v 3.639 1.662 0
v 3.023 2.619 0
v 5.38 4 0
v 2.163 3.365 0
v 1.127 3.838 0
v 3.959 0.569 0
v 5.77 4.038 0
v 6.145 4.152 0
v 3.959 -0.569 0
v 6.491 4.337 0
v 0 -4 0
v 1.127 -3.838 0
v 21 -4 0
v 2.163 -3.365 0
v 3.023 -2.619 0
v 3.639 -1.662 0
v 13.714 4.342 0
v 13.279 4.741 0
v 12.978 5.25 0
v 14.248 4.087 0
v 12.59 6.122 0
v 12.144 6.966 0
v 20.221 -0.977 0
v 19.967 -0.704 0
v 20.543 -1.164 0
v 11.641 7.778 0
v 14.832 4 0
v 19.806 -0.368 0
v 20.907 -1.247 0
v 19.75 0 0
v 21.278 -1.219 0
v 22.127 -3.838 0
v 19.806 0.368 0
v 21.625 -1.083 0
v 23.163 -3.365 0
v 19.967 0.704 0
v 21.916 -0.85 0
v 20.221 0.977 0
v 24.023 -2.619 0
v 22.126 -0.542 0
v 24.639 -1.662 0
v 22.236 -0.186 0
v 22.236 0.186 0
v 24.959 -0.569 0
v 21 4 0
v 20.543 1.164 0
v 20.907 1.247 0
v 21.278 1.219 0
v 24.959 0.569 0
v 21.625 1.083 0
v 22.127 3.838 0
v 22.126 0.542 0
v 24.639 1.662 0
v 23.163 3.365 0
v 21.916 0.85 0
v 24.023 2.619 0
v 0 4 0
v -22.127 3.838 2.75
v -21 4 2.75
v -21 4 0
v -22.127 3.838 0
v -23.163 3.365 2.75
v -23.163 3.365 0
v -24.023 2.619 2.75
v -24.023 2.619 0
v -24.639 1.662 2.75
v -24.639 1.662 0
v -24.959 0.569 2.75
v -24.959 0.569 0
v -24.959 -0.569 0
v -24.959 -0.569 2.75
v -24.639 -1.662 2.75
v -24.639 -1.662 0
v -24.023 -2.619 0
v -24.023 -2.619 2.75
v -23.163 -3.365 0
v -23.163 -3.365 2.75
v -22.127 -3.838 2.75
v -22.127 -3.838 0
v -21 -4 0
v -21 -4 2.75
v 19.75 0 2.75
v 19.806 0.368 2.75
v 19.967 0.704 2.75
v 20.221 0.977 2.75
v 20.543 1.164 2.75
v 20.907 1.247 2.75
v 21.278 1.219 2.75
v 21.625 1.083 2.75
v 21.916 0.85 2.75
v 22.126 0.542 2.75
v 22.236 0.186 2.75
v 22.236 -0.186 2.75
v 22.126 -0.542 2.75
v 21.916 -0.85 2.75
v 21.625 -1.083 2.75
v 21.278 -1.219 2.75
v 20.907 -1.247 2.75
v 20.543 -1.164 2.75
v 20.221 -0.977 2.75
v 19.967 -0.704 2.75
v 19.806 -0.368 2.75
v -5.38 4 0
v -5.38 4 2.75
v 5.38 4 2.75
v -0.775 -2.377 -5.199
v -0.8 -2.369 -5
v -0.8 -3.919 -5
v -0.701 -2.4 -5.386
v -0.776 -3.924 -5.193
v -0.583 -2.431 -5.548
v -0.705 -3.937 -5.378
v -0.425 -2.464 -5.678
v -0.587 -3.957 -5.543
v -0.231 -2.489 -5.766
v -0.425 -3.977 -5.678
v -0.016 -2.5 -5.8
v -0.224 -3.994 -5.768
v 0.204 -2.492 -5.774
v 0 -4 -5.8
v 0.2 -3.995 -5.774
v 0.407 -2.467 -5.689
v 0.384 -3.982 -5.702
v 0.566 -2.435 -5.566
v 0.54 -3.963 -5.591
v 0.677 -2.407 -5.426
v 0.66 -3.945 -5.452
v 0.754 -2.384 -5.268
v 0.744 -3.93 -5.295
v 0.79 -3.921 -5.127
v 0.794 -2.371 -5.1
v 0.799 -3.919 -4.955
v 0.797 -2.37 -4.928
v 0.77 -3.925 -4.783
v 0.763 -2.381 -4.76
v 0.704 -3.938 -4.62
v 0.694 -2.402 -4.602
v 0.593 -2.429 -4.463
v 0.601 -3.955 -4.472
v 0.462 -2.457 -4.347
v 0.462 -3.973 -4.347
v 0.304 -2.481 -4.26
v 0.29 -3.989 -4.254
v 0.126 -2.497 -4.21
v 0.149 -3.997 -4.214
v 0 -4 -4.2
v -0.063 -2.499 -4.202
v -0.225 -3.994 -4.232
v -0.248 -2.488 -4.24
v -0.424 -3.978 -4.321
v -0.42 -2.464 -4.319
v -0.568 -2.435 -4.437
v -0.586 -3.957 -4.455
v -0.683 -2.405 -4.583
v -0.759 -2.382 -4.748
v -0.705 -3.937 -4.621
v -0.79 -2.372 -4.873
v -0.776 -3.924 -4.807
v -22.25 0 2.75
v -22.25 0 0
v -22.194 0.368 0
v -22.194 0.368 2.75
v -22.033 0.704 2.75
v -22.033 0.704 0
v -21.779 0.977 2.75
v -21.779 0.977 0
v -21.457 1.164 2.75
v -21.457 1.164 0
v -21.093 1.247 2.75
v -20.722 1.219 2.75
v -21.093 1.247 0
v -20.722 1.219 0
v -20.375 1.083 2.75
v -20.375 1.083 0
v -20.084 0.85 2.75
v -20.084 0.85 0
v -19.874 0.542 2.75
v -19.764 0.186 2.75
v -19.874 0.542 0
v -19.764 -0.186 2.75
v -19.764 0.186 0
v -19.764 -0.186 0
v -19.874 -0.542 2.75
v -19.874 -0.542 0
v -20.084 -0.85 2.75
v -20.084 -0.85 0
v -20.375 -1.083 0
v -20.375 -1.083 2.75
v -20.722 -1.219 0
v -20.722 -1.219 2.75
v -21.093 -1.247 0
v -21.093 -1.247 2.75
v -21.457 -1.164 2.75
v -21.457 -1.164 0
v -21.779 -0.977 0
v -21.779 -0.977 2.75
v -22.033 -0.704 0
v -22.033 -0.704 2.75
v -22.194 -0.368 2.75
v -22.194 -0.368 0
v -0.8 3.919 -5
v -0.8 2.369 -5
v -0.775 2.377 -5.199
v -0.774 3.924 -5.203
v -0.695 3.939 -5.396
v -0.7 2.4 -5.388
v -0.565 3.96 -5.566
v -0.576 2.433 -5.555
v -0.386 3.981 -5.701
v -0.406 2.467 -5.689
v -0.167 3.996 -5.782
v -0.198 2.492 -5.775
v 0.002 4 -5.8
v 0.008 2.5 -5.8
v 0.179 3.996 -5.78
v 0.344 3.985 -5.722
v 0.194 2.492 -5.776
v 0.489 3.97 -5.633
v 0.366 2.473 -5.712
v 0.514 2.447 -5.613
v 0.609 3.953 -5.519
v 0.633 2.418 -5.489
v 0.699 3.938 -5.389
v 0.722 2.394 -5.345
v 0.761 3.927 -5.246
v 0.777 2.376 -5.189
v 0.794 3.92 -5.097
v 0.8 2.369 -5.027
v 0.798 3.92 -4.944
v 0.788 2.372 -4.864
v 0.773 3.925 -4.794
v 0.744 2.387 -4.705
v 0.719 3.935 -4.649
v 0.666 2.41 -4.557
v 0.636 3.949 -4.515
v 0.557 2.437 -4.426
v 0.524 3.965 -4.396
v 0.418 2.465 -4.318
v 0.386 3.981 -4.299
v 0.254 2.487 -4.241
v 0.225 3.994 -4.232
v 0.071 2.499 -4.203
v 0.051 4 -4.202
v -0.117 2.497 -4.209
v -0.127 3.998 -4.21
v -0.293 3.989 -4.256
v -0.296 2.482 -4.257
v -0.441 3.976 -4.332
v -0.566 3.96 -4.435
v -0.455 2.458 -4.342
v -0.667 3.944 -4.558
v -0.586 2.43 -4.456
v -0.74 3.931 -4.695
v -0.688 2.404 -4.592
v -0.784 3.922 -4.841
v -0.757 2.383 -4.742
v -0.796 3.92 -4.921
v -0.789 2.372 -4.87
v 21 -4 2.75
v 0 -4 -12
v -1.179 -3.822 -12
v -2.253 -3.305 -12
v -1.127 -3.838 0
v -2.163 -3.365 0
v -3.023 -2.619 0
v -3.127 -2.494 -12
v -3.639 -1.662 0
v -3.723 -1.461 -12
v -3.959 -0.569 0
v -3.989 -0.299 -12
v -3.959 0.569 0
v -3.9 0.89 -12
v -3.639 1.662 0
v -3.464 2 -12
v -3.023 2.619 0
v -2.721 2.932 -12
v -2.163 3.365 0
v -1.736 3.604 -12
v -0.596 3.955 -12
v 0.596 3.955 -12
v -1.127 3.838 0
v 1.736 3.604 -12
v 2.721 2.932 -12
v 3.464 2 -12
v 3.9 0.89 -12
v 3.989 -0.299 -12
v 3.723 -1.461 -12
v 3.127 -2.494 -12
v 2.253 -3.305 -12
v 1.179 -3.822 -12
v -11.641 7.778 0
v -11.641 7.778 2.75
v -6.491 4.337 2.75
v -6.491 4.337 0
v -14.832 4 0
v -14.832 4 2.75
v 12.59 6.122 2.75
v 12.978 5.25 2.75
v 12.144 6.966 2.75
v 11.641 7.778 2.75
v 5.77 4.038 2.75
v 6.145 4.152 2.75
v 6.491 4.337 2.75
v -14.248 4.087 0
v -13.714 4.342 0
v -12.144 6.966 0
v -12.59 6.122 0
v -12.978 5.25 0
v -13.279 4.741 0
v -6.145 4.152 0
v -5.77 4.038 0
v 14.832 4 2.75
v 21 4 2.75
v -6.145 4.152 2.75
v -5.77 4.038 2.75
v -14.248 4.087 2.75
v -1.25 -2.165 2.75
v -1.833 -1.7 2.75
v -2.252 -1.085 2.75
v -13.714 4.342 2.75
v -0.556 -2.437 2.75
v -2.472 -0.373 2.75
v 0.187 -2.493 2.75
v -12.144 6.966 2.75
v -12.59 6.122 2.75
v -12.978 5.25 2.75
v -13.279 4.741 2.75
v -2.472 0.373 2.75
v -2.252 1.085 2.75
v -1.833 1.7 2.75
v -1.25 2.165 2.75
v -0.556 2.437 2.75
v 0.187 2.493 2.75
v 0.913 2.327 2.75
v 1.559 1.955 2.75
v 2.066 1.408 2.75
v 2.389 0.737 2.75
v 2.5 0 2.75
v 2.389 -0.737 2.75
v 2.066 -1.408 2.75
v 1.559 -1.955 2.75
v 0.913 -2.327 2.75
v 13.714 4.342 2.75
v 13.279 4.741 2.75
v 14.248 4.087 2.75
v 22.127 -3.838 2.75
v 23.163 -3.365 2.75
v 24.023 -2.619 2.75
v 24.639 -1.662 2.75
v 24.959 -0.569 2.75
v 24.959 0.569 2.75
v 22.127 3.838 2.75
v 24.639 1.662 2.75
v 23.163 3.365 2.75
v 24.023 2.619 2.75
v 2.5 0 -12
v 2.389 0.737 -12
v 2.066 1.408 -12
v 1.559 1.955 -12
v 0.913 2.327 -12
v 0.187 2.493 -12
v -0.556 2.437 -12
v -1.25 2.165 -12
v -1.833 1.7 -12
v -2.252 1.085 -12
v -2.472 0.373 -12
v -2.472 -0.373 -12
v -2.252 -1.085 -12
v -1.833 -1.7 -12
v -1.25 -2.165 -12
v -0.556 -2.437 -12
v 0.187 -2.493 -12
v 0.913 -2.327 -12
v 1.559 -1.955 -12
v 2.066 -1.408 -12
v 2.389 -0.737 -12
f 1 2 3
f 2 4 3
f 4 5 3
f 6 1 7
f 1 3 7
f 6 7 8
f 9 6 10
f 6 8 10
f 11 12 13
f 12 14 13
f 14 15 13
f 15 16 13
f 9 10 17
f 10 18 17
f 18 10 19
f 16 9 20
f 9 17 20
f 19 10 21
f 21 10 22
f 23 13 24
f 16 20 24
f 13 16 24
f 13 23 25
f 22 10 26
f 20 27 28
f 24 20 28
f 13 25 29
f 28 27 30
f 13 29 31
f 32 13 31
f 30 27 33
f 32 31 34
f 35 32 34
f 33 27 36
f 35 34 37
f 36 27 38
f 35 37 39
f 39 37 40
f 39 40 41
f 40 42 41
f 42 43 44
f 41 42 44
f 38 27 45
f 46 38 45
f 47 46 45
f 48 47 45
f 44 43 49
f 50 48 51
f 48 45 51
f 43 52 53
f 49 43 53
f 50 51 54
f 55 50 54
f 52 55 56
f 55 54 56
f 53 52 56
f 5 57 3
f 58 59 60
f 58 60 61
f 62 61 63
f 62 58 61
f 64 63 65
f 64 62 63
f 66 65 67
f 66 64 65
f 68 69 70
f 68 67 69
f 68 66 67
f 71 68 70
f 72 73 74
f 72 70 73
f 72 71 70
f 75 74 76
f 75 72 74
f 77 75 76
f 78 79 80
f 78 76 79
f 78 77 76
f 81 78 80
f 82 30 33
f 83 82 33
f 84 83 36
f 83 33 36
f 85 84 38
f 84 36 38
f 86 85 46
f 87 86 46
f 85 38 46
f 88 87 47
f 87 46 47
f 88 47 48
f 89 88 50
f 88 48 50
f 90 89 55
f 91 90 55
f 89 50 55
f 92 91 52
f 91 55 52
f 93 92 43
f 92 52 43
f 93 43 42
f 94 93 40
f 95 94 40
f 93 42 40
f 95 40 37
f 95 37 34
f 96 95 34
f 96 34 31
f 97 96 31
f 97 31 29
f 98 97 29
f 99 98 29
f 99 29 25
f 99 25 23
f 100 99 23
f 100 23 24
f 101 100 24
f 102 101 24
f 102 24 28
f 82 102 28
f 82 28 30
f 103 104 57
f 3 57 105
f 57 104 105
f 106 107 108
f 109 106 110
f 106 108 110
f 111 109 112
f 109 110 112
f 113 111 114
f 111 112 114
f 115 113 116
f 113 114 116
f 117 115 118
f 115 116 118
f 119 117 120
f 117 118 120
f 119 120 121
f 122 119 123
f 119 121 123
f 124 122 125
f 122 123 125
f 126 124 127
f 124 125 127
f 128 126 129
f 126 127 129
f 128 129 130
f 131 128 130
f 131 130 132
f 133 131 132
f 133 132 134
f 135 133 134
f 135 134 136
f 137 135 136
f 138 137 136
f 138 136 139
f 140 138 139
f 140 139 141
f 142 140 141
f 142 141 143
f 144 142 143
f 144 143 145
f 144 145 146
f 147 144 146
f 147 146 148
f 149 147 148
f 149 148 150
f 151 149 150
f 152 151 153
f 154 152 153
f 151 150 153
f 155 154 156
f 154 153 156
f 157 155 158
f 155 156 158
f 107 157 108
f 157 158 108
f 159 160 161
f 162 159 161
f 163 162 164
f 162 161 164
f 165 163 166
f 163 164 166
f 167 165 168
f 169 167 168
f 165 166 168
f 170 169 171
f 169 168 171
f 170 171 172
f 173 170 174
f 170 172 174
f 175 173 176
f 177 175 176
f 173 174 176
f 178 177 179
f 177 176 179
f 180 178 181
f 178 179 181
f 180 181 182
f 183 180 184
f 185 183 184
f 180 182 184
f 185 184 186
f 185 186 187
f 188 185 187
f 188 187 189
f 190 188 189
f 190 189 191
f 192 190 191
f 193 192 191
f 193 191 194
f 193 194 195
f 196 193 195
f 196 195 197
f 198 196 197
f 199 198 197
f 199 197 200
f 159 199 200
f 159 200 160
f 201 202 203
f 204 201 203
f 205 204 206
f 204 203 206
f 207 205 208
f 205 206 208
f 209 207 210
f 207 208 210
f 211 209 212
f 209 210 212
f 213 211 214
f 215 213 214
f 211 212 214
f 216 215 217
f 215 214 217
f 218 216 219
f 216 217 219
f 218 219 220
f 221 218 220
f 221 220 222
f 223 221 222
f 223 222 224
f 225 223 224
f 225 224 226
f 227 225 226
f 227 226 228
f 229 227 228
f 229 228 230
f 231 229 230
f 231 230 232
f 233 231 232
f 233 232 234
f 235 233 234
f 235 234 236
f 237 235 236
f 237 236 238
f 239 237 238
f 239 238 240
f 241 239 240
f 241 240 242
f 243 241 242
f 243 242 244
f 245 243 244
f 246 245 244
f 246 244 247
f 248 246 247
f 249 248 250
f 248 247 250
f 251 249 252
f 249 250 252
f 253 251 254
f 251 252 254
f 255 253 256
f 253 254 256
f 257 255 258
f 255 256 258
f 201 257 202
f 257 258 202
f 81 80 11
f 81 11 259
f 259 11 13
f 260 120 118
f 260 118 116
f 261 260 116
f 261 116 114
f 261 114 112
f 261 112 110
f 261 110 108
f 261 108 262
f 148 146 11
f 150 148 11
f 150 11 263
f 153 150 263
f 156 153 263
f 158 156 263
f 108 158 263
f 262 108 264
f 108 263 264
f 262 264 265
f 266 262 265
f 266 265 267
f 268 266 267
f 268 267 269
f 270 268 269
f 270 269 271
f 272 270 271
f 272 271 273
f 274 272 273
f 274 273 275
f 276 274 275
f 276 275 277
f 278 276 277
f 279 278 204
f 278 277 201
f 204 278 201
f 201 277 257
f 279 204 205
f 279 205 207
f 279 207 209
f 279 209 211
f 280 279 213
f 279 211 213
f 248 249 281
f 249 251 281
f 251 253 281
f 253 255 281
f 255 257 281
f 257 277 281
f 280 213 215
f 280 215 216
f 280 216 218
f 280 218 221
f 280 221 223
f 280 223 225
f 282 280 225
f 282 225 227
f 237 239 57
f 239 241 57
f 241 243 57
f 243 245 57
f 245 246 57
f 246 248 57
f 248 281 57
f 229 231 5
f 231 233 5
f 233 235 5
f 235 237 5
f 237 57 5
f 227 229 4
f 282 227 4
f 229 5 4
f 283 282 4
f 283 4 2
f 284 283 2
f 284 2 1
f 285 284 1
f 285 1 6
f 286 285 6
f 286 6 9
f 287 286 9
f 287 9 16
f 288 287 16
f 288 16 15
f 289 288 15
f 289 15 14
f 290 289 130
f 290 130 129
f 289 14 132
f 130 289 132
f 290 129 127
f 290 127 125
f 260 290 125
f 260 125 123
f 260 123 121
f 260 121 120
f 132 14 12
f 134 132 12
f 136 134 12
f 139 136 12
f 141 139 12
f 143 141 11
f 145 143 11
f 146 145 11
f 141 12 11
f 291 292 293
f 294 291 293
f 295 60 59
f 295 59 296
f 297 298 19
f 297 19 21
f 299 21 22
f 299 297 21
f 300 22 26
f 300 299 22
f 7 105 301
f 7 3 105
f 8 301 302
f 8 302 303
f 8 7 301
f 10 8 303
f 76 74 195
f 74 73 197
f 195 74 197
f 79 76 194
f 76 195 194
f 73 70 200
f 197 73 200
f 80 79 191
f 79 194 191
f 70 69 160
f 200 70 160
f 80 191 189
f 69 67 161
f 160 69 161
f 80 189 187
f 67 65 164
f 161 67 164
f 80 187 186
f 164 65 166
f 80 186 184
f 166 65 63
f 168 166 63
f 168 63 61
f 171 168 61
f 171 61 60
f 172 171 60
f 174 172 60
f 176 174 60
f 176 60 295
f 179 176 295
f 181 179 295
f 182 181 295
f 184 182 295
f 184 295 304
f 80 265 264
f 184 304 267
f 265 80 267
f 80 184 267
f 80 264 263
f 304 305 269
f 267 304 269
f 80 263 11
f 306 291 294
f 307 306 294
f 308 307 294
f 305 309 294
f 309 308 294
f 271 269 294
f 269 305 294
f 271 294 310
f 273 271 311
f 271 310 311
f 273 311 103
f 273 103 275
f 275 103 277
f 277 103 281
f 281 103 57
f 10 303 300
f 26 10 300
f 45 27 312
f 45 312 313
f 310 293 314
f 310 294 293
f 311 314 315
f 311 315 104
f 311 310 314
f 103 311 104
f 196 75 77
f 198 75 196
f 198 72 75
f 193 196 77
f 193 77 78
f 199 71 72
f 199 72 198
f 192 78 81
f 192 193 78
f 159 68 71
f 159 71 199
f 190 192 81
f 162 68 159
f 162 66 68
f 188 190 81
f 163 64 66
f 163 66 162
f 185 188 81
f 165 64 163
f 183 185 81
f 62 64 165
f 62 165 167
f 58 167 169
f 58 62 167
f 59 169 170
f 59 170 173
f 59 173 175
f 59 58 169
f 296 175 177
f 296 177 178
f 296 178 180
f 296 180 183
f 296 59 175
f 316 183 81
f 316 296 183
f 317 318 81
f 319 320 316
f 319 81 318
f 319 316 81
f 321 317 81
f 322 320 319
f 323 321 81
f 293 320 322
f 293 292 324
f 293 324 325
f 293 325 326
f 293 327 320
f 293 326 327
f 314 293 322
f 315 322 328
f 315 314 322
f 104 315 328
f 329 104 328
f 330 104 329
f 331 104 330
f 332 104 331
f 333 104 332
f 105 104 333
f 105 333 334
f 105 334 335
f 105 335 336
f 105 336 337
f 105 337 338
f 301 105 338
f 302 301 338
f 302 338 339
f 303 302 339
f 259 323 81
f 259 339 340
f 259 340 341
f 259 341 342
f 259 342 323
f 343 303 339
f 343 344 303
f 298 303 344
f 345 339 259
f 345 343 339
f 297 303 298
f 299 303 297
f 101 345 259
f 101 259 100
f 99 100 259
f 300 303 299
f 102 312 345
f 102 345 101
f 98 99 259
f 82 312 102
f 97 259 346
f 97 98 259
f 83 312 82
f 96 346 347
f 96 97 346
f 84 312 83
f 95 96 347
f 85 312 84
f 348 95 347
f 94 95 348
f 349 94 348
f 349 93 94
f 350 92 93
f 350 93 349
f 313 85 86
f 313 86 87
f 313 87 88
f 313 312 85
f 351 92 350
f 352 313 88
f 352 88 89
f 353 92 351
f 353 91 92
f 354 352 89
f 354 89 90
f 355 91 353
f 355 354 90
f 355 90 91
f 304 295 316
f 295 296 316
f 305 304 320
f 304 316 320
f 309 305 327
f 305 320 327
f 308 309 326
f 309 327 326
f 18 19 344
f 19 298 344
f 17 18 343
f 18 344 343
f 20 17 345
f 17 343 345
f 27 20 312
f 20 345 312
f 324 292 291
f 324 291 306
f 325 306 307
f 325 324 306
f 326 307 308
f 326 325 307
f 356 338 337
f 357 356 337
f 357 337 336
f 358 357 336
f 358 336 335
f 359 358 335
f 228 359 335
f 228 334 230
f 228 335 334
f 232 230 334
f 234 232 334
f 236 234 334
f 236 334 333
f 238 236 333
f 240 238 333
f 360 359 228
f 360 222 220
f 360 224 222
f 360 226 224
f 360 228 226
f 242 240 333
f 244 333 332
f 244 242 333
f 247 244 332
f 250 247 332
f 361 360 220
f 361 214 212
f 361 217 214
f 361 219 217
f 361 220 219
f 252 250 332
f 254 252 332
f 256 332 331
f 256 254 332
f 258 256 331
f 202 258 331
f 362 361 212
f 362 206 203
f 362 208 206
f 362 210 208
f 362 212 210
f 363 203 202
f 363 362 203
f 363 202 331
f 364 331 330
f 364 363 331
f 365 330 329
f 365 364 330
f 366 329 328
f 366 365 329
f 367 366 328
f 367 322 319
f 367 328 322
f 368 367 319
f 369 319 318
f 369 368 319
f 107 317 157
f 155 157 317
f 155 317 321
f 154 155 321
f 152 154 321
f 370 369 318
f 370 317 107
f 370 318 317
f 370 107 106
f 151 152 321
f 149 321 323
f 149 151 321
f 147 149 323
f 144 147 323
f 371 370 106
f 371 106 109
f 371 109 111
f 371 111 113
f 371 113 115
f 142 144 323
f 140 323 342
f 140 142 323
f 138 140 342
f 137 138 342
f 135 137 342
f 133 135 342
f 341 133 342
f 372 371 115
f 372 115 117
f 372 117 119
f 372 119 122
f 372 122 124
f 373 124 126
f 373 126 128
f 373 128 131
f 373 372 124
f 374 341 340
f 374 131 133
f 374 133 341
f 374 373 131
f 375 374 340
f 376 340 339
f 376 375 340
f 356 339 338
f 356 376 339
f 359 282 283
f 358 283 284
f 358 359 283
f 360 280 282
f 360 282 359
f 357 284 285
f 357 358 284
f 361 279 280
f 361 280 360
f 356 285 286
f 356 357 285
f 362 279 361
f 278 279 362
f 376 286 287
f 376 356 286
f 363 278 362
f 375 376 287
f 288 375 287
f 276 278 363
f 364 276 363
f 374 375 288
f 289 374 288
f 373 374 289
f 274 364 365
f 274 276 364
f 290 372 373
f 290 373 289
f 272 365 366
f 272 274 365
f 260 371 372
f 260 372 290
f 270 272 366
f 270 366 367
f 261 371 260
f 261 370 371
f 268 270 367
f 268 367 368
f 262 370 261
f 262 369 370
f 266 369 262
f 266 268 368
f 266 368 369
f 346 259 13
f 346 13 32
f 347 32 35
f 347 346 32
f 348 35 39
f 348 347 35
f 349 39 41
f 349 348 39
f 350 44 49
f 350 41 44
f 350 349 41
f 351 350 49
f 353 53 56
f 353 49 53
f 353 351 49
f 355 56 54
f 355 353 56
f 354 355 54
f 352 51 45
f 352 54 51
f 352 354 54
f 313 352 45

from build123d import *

# Parameters (mm, degrees)
SKETCH_1_W             = 50
SKETCH_1_H             = 8
EXTRUDE_484_DEPTH      = 2.75
SKETCH_6_R             = 4
EXTRUDE_752_DEPTH      = 12
HOLE_WIZARD_M3_D       = 2.5
HOLE_WIZARD_M2_D       = 1.6
EXTRUDE_3073_DEPTH     = 2.75
CUT_EXTRUDE_3452_DEPTH = 2.75
SKETCH_10_R            = 2.5
CUT_EXTRUDE_3895_DEPTH = 31.050948797
FILLET_4_RADIUS        = 4
FILLET_4_LENGTH        = 2.75
FILLET_5_RADIUS        = 4
FILLET_5_LENGTH        = 2.75
FILLET_6_R             = 2


with BuildPart() as part:
    # Эскиз1 → Extrude 484 (new body)
    with BuildSketch(Plane.XY):
        Rectangle(SKETCH_1_W, SKETCH_1_H)
    extrude(amount=EXTRUDE_484_DEPTH)

    # Эскиз6 → Extrude 752 (add)
    with BuildSketch(Plane(origin=(0, 0, 0), x_dir=(-1, 0, 0), z_dir=(0, 0, -1))):
        with Locations(Location((0, 0, 0), (0, 0, 270))):
            Circle(SKETCH_6_R)
    extrude(amount=EXTRUDE_752_DEPTH)

    # Крепление толкателей M3 (through all)
    with Locations(Plane.XY.offset(2.75)):
        with Locations((-21, 0), (21, 0)):
            Hole(HOLE_WIZARD_M3_D / 2)

    # Крепление вала M2 (through all)
    with Locations(Plane(origin=(0, 4, -5), x_dir=(1, 0, 0), z_dir=(0, 1, 0))):
        with Locations((0, 0)):
            Hole(HOLE_WIZARD_M2_D / 2)

    # Эскиз11 → Extrude 3073 (add)
    with BuildSketch(Plane.XY.offset(2.75)):
        with BuildLine():
            Line((-14, 0), (0, 0))
            Line((0, 0), (14, 0))
            ThreePointArc((14, 0), (0, 14), (-14, 0))
        make_face()
    extrude(amount=-EXTRUDE_3073_DEPTH)

    # Эскиз12 → Cut-Extrude 3452 (cut)
    with BuildSketch(Plane.XY.offset(2.75)):
        with BuildLine():
            Line((-5.986423051, 4), (5.986423051, 4))
            Line((5.986423051, 4), (11.640574572, 7.777983262))
            ThreePointArc((11.640574572, 7.777983262), (0, 14), (-11.640574572, 7.777983262))
            Line((-11.640574572, 7.777983262), (-5.986423051, 4))
        make_face()
    extrude(amount=-CUT_EXTRUDE_3452_DEPTH, mode=Mode.SUBTRACT)

    # Эскиз10 → Cut-Extrude 3895 (cut, through all)
    with BuildSketch(Plane.XY.offset(-12)):
        Circle(SKETCH_10_R)
    extrude(amount=CUT_EXTRUDE_3895_DEPTH, mode=Mode.SUBTRACT)

    # Скругление4: full round fillet: the end face becomes a half cylinder, R = half its width
    fillet_4_face = Plane((-25, 0, 1.375), x_dir=(0, 0, 1), z_dir=(-1, 0, 0))  # on the end face: x along it, z out of the body
    fillet_4_slab = fillet_4_face.offset(-FILLET_4_RADIUS / 2) * Box(FILLET_4_LENGTH, 2 * FILLET_4_RADIUS, FILLET_4_RADIUS, mode=Mode.PRIVATE)  # the body's end, R deep
    fillet_4_round = Plane((-21, 0, 1.375), x_dir=(-1, 0, 0), z_dir=(0, 0, 1)) * Cylinder(FILLET_4_RADIUS, FILLET_4_LENGTH, mode=Mode.PRIVATE)  # its axis R under the face
    add(fillet_4_slab - fillet_4_round, mode=Mode.SUBTRACT)

    # Скругление5: full round fillet: the end face becomes a half cylinder, R = half its width
    fillet_5_face = Plane((25, 0, 1.375), x_dir=(0, 0, 1), z_dir=(1, 0, 0))  # on the end face: x along it, z out of the body
    fillet_5_slab = fillet_5_face.offset(-FILLET_5_RADIUS / 2) * Box(FILLET_5_LENGTH, 2 * FILLET_5_RADIUS, FILLET_5_RADIUS, mode=Mode.PRIVATE)  # the body's end, R deep
    fillet_5_round = Plane((21, 0, 1.375), x_dir=(1, 0, 0), z_dir=(0, 0, 1)) * Cylinder(FILLET_5_RADIUS, FILLET_5_LENGTH, mode=Mode.PRIVATE)  # its axis R under the face
    add(fillet_5_slab - fillet_5_round, mode=Mode.SUBTRACT)

    # Скругление6
    fillet_6_edges = [part.edges().sort_by_distance(p)[0] for p in [
        (13.416407865, 4, 1.375),
        (-13.416407865, 4, 1.375),
        (5.986423051, 4, 1.375),
        (-5.986423051, 4, 1.375),
    ]]
    fillet(fillet_6_edges, radius=FILLET_6_R)


solid = part.part
